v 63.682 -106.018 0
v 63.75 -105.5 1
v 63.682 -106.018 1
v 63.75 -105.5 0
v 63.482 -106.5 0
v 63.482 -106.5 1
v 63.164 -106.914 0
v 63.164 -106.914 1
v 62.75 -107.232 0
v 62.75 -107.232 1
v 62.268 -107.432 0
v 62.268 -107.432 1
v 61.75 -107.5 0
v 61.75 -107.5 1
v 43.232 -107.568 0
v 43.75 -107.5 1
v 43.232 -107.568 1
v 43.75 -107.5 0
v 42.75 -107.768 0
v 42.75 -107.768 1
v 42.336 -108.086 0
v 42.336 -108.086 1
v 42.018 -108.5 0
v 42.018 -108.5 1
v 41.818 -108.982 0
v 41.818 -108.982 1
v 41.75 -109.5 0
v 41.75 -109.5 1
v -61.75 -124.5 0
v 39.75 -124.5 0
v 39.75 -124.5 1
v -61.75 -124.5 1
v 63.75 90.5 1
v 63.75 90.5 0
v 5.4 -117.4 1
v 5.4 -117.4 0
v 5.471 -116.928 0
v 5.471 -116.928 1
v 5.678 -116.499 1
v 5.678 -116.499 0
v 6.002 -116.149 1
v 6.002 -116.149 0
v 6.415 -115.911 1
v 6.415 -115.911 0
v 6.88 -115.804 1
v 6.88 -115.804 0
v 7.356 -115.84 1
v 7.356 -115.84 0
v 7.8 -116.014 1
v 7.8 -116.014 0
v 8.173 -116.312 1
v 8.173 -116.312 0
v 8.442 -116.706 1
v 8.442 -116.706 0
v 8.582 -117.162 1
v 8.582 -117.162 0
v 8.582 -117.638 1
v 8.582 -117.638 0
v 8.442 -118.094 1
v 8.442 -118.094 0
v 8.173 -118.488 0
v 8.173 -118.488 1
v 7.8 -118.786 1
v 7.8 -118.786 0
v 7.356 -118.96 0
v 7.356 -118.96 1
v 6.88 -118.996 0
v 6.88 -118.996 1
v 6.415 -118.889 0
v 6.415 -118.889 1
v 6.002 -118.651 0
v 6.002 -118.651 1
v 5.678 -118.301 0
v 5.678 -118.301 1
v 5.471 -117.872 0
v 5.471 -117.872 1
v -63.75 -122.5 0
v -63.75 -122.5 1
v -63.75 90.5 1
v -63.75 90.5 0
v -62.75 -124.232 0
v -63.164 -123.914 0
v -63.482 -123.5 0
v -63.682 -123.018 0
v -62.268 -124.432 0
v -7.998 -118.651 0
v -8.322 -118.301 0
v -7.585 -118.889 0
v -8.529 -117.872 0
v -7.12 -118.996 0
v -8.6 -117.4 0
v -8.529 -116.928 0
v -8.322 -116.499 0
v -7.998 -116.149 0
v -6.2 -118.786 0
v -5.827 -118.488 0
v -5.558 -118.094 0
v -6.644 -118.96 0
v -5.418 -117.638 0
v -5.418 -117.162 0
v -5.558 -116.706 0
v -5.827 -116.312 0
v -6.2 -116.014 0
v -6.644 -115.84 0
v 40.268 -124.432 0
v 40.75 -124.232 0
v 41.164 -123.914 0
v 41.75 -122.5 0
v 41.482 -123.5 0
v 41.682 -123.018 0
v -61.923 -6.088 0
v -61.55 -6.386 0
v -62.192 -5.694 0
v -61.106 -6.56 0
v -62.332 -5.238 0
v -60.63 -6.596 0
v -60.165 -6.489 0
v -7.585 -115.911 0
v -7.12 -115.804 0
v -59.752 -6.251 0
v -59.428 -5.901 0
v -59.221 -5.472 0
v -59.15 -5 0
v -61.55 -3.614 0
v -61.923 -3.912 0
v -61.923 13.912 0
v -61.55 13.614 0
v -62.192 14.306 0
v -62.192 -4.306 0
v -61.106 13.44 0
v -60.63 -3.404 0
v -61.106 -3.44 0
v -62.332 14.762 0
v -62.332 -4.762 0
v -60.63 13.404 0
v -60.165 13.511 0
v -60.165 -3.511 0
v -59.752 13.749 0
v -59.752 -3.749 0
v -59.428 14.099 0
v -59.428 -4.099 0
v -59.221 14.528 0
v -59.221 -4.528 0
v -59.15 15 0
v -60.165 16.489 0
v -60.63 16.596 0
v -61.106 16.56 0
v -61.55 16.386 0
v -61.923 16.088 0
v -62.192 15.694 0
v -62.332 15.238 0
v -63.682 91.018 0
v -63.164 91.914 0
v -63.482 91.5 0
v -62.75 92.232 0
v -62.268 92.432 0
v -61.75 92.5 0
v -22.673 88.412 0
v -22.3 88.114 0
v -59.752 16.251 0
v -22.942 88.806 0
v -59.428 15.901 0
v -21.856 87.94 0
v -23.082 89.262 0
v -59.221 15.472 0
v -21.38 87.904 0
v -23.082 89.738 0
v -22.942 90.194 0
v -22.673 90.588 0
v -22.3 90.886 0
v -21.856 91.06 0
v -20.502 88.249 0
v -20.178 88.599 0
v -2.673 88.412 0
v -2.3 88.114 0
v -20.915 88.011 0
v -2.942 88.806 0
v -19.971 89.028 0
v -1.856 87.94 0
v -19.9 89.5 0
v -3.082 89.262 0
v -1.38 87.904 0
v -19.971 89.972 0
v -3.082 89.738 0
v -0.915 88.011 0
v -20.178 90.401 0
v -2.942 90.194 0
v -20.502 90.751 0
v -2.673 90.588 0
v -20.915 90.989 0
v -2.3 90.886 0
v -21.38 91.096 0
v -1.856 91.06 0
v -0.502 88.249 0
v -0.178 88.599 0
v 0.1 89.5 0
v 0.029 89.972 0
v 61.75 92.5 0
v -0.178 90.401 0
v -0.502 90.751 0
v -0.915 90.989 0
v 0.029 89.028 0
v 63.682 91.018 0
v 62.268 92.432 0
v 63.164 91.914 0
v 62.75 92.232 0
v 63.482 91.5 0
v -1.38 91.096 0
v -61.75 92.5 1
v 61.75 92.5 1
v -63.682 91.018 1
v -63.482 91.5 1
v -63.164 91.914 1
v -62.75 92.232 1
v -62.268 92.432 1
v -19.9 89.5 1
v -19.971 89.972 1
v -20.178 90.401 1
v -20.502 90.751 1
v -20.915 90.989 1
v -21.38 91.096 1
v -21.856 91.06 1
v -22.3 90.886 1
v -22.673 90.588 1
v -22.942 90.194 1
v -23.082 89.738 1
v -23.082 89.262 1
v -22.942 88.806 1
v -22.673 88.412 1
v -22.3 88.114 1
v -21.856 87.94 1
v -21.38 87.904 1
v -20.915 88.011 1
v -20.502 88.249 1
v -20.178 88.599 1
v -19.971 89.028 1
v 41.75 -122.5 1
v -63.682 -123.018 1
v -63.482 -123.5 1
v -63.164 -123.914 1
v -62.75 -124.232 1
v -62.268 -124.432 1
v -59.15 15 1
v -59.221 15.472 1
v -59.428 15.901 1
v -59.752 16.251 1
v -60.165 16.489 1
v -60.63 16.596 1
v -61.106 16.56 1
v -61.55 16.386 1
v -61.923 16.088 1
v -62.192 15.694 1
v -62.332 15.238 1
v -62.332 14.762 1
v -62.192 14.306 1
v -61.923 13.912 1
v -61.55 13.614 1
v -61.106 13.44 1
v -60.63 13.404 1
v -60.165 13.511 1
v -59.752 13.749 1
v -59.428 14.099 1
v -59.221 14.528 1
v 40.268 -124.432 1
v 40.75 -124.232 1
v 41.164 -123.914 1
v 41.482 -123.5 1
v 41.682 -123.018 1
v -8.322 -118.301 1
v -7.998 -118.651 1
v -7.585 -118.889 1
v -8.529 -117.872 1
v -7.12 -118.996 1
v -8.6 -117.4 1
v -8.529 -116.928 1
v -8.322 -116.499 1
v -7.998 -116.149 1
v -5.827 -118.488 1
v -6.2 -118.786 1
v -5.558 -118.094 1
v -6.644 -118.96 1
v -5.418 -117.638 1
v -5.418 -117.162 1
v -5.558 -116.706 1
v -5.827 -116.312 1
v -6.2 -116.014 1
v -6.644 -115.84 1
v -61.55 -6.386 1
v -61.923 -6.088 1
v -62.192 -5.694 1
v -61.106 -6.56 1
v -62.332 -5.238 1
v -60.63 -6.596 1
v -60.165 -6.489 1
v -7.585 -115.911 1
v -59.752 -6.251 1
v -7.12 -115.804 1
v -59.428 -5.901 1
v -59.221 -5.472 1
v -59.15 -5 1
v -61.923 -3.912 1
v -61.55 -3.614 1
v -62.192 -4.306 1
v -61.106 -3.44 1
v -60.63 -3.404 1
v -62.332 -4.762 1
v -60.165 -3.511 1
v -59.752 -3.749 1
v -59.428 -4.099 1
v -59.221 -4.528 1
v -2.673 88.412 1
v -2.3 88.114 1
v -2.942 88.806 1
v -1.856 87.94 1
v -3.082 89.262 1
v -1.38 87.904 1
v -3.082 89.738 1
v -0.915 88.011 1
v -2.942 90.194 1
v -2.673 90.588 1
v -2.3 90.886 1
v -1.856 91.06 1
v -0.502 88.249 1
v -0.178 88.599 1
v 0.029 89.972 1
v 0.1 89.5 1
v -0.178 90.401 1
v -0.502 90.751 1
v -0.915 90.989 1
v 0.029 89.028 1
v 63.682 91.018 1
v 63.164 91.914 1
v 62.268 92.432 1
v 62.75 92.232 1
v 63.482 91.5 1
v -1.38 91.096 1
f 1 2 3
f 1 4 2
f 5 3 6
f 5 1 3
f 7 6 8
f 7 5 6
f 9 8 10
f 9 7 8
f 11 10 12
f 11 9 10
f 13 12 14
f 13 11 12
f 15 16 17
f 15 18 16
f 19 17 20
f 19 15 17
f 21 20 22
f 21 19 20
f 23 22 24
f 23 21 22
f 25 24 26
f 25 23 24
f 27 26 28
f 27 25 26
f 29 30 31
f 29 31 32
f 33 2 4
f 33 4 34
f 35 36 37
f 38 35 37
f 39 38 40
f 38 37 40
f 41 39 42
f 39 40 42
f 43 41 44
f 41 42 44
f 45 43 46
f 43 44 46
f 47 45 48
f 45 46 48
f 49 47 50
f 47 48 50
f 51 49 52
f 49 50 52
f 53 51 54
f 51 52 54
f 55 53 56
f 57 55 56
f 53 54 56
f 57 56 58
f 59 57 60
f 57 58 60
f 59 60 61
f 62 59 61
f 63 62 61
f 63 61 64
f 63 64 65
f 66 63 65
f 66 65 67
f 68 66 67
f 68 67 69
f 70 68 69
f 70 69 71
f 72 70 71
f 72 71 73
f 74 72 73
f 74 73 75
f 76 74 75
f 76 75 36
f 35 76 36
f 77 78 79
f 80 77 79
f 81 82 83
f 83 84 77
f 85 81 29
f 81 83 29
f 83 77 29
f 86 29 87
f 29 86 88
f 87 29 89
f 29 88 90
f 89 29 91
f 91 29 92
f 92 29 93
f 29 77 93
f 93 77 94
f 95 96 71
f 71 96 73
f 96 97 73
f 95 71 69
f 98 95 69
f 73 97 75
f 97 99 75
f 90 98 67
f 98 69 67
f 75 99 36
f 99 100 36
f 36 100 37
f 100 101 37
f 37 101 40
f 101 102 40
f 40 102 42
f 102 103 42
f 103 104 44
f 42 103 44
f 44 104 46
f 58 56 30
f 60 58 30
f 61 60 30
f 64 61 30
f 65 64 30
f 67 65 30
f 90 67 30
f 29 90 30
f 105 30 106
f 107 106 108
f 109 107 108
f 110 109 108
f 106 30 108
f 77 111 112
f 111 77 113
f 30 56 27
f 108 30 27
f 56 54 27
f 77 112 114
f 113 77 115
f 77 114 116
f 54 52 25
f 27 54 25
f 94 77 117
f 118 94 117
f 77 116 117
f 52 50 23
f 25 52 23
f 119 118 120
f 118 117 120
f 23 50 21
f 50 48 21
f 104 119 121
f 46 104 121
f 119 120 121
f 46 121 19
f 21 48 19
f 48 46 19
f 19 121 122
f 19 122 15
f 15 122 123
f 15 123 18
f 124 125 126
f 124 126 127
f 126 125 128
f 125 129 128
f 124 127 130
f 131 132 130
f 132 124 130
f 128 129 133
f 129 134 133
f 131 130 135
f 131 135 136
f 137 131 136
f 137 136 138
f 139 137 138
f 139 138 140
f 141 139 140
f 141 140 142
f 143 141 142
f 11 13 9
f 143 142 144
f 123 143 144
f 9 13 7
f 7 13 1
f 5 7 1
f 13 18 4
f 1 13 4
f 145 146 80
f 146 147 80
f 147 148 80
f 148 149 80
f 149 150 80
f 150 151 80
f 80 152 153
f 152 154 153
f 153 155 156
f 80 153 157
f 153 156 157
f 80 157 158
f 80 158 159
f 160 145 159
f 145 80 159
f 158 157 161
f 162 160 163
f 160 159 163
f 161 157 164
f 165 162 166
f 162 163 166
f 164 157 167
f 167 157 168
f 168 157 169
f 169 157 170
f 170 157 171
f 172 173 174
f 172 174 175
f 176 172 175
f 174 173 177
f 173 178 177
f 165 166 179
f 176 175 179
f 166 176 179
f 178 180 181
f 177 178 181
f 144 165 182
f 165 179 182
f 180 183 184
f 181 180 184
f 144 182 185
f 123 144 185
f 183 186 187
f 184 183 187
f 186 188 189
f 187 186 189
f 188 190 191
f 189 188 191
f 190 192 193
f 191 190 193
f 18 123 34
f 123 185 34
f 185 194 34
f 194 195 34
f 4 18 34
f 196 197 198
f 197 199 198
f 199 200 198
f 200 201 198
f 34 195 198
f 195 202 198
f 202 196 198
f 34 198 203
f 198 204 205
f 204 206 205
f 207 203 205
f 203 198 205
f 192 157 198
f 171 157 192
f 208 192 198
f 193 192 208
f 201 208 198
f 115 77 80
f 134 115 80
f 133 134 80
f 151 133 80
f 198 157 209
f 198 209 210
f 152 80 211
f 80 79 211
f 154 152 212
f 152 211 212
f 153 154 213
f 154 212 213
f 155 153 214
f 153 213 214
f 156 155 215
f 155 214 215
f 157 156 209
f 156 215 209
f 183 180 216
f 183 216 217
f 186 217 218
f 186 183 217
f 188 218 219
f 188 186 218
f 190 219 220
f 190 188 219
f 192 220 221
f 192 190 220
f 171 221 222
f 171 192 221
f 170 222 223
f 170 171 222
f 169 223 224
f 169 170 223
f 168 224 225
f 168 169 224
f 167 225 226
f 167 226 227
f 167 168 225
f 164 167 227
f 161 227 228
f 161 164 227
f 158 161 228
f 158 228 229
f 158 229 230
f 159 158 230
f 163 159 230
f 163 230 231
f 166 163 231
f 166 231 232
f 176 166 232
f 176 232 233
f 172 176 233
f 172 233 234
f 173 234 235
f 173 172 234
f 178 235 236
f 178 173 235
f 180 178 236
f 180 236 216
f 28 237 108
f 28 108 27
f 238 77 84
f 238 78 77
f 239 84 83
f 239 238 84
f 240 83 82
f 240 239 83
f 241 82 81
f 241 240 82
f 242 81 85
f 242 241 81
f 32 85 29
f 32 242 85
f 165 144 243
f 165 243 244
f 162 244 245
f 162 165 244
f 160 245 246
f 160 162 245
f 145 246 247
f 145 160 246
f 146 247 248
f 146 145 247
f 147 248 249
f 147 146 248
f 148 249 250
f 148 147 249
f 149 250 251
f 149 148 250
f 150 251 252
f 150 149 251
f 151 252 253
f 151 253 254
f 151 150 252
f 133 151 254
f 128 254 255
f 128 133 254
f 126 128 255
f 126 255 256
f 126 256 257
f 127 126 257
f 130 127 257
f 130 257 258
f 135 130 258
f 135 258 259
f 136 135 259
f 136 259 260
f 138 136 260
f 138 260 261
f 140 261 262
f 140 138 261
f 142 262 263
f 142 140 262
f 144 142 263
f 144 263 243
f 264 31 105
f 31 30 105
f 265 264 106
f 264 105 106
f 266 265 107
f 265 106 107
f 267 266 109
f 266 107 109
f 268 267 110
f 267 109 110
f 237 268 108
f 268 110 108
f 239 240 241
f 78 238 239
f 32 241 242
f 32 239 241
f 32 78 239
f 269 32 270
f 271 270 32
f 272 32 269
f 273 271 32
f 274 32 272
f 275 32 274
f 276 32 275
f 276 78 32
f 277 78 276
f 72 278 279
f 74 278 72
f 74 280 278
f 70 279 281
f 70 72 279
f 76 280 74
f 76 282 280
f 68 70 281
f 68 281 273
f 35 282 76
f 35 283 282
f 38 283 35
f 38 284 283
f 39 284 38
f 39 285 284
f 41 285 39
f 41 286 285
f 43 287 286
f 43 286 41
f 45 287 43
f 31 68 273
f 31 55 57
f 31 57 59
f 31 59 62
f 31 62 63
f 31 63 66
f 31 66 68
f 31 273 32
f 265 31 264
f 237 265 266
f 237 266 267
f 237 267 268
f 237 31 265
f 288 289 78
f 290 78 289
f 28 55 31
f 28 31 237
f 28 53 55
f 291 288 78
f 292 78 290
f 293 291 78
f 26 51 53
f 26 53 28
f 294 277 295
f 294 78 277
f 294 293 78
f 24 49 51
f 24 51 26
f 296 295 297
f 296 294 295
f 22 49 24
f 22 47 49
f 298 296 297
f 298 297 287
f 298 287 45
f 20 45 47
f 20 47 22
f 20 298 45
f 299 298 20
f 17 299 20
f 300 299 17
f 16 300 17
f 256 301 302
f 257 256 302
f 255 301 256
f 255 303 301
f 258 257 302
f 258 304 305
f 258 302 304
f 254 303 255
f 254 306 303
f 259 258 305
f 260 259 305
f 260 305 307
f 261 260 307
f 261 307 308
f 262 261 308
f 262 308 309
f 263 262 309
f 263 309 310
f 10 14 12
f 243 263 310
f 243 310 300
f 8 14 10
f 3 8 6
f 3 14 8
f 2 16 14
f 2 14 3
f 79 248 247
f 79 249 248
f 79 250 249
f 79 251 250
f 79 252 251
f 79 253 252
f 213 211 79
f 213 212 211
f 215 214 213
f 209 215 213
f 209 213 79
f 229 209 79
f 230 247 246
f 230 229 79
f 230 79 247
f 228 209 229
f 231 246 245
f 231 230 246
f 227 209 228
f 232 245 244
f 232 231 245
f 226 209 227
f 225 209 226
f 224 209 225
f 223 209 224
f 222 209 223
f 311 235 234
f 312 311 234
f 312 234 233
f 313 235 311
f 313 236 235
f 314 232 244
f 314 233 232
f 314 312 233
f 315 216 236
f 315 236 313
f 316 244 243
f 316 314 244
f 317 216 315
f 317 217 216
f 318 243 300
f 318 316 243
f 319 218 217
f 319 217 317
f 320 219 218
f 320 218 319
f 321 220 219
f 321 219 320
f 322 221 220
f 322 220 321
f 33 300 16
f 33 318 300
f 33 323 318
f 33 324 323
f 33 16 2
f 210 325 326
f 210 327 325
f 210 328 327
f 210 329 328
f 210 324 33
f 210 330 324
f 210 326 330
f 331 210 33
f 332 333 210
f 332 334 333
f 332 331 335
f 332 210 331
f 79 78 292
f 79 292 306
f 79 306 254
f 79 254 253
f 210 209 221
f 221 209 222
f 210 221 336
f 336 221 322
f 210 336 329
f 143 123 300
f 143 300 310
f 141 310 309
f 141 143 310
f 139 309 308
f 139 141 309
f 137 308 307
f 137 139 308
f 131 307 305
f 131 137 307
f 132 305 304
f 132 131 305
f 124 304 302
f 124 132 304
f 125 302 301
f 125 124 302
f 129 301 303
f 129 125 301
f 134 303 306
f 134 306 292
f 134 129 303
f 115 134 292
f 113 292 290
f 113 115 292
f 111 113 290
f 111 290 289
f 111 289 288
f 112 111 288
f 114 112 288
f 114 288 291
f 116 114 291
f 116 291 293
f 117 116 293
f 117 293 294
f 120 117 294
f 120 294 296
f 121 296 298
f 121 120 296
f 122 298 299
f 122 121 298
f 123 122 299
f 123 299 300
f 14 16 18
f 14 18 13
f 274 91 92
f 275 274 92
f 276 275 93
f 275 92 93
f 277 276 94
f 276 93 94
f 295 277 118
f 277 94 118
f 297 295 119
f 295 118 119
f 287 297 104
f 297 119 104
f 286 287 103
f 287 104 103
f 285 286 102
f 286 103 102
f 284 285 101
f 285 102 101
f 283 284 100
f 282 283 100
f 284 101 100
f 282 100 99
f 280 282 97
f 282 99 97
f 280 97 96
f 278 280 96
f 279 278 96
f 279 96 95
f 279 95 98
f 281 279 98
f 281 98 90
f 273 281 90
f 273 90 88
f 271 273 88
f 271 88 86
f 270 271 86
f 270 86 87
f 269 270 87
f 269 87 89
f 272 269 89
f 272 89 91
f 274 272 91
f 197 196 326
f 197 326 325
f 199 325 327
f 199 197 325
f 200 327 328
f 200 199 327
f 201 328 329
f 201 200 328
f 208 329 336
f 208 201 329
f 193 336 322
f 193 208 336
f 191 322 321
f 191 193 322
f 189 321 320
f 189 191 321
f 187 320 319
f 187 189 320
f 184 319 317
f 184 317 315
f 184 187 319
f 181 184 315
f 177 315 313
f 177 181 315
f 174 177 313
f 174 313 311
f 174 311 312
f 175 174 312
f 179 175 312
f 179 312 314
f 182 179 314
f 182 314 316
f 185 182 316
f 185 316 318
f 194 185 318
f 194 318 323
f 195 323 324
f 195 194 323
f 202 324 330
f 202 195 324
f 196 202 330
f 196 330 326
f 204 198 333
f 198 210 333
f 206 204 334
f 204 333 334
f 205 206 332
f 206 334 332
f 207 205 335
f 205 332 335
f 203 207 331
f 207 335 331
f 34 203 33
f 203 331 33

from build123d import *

# Parameters (mm, degrees)
SKETCH_1_W          = 127.5
SKETCH_1_H          = 185
SKETCH_1_R          = 1.6
EXTRUDE_1_DEPTH     = 1
SKETCH_2_W          = 127.5
SKETCH_2_H          = 35
EXTRUDE_2_DEPTH     = 1
SKETCH_3_R          = 1.6
CUT_EXTRUDE_1_DEPTH = 10
SKETCH_4_W          = 127.5
SKETCH_4_H          = 3
CUT_EXTRUDE_2_DEPTH = 10
SKETCH_5_W          = 22
SKETCH_5_H          = 17
CUT_EXTRUDE_3_DEPTH = 10
FILLET_2_R          = 2


with BuildPart() as part:
    # 草图1 → 凸台-拉伸1 (new body)
    with BuildSketch(Plane.XY):
        Rectangle(SKETCH_1_W, SKETCH_1_H)
        with Locations((-21.5, 89.5)):
            Circle(SKETCH_1_R, mode=Mode.SUBTRACT)
        with Locations((-1.5, 89.5)):
            Circle(SKETCH_1_R, mode=Mode.SUBTRACT)
        with Locations((-60.75, 15)):
            Circle(SKETCH_1_R, mode=Mode.SUBTRACT)
        with Locations((-60.75, -5)):
            Circle(SKETCH_1_R, mode=Mode.SUBTRACT)
    extrude(amount=EXTRUDE_1_DEPTH)

    # 草图2 → 凸台-拉伸2 (add)
    with BuildSketch(Plane.XY.offset(1)):
        with Locations((0, -110)):
            Rectangle(SKETCH_2_W, SKETCH_2_H)
    extrude(amount=-EXTRUDE_2_DEPTH)

    # 草图3 → 切除-拉伸1 (cut)
    with BuildSketch(Plane(origin=(0, 0, 0), x_dir=(-1, 0, 0), z_dir=(0, 0, -1))):
        with Locations((-7, -117.4)):
            Circle(SKETCH_3_R)
        with Locations((7, -117.4)):
            Circle(SKETCH_3_R)
    extrude(amount=-CUT_EXTRUDE_1_DEPTH, mode=Mode.SUBTRACT)

    # 草图4 → 切除-拉伸2 (cut)
    with BuildSketch(Plane(origin=(0, 0, 0), x_dir=(-1, 0, 0), z_dir=(0, 0, -1))):
        with Locations((0, -126)):
            Rectangle(SKETCH_4_W, SKETCH_4_H)
    extrude(amount=-CUT_EXTRUDE_2_DEPTH, mode=Mode.SUBTRACT)

    # 草图5 → 切除-拉伸3 (cut)
    with BuildSketch(Plane.XY.offset(1)):
        with Locations((52.75, -116)):
            Rectangle(SKETCH_5_W, SKETCH_5_H)
    extrude(amount=-CUT_EXTRUDE_3_DEPTH, mode=Mode.SUBTRACT)

    # 圆角2
    fillet_2_edges = [part.edges().sort_by_distance(p)[0] for p in [
        (-63.75, -124.5, 0.5),
        (41.75, -124.5, 0.5),
        (-63.75, 92.5, 0.5),
        (63.75, 92.5, 0.5),
        (63.75, -107.5, 0.5),
        (41.75, -107.5, 0.5),
    ]]
    fillet(fillet_2_edges, radius=FILLET_2_R)


solid = part.part
